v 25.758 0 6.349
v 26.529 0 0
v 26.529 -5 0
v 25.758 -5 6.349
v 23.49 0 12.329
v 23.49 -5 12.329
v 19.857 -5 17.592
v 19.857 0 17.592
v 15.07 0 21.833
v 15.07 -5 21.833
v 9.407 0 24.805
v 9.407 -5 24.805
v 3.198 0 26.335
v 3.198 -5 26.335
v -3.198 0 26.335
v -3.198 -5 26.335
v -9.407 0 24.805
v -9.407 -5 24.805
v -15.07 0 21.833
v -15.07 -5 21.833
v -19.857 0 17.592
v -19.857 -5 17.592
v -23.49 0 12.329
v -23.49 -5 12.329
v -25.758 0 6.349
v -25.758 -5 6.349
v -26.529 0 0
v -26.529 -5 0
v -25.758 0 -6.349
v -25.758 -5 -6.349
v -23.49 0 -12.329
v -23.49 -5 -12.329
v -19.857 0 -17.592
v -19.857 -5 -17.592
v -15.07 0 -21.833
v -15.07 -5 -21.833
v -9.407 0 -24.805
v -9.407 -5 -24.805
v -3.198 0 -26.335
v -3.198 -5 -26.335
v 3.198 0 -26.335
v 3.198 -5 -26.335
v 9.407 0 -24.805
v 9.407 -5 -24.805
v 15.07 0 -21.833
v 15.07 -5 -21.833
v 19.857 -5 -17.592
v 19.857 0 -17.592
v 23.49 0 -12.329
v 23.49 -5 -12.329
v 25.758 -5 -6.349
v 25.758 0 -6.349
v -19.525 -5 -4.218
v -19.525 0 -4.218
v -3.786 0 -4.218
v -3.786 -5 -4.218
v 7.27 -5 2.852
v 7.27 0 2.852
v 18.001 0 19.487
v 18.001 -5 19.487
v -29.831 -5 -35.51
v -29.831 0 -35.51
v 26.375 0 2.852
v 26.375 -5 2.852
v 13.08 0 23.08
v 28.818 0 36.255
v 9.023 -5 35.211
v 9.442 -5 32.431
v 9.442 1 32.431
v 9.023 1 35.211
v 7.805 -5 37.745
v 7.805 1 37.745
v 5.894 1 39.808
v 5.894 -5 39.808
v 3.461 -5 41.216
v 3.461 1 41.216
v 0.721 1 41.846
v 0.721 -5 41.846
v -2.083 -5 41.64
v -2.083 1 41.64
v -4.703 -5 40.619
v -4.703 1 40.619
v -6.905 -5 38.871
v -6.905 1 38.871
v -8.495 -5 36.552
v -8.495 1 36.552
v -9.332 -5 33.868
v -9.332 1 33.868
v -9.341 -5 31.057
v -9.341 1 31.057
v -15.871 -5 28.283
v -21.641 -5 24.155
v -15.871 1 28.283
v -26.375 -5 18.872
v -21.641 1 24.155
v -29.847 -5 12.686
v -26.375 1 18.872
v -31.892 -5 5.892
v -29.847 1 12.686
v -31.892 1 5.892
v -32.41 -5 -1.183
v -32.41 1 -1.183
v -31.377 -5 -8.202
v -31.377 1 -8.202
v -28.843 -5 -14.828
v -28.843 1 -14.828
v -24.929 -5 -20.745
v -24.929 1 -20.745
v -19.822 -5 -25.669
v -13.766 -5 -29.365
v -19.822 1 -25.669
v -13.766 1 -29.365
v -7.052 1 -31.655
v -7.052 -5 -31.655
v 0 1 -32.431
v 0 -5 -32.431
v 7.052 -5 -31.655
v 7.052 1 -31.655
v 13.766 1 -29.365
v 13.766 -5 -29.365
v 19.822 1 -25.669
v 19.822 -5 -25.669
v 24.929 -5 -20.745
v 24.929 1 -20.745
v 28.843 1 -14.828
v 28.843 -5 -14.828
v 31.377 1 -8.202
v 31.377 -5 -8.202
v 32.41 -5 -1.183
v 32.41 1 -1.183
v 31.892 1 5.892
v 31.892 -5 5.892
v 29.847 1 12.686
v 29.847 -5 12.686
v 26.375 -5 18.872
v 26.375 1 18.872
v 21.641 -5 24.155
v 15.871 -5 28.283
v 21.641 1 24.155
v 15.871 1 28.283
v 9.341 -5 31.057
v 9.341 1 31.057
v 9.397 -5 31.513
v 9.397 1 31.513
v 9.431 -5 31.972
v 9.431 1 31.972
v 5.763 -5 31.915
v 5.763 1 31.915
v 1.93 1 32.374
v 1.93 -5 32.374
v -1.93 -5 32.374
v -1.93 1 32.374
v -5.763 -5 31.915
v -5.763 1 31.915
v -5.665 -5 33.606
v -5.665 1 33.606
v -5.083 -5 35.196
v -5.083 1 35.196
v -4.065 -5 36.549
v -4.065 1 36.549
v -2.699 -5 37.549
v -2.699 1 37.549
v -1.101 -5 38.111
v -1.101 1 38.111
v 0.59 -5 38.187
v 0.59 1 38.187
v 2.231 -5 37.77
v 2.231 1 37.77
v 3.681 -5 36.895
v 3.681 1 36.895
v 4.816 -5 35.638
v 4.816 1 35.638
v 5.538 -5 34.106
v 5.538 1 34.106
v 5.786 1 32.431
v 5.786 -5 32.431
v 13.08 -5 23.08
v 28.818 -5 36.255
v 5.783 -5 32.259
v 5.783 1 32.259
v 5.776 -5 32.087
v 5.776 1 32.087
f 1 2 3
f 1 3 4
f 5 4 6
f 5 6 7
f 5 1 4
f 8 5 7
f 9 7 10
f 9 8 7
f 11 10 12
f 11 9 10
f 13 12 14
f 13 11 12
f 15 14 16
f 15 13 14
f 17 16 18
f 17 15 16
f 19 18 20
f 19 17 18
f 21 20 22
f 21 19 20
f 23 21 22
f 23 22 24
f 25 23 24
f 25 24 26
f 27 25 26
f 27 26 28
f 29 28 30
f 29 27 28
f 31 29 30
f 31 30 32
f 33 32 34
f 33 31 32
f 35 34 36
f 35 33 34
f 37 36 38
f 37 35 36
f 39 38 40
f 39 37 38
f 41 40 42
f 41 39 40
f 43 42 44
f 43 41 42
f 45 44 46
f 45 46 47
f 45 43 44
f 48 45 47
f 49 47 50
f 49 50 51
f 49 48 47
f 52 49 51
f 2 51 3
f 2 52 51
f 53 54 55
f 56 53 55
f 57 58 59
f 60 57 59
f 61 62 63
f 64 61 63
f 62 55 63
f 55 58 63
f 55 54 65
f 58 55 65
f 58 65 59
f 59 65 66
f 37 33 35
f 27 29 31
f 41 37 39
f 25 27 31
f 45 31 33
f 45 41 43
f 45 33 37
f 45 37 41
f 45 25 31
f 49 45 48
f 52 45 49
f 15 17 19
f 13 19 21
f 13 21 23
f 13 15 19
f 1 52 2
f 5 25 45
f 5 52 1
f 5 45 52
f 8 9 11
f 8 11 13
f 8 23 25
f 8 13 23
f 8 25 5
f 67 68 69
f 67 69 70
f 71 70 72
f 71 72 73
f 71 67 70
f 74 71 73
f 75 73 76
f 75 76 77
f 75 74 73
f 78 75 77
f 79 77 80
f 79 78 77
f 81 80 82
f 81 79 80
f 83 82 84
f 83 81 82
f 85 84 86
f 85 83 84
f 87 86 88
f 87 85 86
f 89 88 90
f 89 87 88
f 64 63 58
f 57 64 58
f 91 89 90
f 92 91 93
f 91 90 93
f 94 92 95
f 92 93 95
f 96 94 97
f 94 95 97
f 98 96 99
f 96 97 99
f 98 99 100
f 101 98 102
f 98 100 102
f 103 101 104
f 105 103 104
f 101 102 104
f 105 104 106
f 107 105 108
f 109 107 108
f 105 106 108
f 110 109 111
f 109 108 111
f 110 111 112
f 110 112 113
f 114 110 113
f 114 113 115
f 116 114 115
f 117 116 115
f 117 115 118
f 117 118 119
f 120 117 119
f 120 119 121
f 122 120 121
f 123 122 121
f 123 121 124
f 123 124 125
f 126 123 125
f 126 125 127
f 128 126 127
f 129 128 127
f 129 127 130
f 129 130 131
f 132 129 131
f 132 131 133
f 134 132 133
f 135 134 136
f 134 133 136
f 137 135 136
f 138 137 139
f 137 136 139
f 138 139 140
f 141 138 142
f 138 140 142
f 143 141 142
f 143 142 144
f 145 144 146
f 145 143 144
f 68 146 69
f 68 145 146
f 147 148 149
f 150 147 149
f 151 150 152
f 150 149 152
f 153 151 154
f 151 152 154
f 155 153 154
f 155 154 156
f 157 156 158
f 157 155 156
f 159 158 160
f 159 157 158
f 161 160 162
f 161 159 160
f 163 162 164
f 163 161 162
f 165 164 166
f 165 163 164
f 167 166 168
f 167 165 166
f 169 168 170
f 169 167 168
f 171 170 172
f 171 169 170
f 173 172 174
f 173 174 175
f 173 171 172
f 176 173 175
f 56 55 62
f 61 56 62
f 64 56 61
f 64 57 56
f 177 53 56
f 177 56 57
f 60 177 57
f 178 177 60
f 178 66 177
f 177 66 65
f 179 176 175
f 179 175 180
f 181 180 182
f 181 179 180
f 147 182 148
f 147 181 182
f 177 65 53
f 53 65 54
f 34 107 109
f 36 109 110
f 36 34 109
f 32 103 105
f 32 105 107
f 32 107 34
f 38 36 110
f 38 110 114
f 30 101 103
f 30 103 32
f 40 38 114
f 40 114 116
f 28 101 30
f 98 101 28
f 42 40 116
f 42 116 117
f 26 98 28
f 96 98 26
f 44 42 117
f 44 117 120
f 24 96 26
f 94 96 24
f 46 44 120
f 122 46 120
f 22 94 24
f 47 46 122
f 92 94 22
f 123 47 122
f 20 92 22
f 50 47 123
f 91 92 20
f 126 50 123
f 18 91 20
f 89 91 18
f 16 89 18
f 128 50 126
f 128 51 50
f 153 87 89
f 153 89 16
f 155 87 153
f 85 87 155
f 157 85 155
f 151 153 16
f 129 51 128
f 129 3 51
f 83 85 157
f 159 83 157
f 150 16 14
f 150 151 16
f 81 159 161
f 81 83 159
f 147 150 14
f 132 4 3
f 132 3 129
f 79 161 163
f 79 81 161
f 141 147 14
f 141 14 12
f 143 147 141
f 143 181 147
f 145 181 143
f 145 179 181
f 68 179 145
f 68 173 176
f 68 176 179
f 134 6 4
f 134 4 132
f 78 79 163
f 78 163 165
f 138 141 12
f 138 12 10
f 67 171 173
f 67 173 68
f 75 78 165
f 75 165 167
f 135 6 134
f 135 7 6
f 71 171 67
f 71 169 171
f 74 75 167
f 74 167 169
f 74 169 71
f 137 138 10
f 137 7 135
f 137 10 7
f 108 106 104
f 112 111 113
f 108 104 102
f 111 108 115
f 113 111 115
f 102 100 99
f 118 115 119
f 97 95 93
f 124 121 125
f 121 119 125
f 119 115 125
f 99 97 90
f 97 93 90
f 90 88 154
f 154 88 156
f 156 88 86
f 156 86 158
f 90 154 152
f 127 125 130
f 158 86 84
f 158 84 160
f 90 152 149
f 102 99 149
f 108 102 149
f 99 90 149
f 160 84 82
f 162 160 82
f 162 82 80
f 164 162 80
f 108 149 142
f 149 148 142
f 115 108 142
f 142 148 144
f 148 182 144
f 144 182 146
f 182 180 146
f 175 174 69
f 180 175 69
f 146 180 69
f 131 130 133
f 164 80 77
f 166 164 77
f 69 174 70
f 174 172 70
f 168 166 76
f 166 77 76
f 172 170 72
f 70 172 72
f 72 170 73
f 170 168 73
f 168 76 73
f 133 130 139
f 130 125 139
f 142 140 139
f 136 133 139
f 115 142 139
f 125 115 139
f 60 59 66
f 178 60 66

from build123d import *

# Parameters (mm, degrees)
F0_R     = 32.4313338528
F1_DEPTH = 1
F2_R     = 32.4313338528
F2_R_2   = 26.5287639538
F3_DEPTH = 5
F5_DEPTH = 5
F7_DEPTH = 6


with BuildPart() as f1:
    # F0 (on Front) → F1 (new body)
    with BuildSketch(Plane.XZ):
        Circle(F0_R)
    extrude(amount=-F1_DEPTH)

    # F2 (on face) → F3 (join)
    with BuildSketch(Plane.XZ):
        Circle(F2_R)
        Circle(F2_R_2, mode=Mode.SUBTRACT)
    extrude(amount=F3_DEPTH)

    # F6 (on face) → F7 (join)
    with BuildSketch(Plane.XZ.offset(5)):
        with BuildLine():
            ThreePointArc((-5.7628004775, 31.9152243628), (-0.258312309, 38.2114301409), (5.7858653932, 32.4313338528))
            ThreePointArc((5.7858653932, 32.4313338528), (5.7800962881, 32.1730215438), (5.7628004775, 31.9152243628))
            ThreePointArc((5.7628004775, 31.9152243628), (7.5641556763, 31.536882604), (9.3411452706, 31.0569544628))
            ThreePointArc((9.3411452706, 31.0569544628), (9.4165362852, 31.7423069577), (9.4417113742, 32.4313338528))
            ThreePointArc((9.4417113742, 32.4313338528), (-0.6890268951, 41.8478701381), (-9.3411452706, 31.0569544628))
            ThreePointArc((-9.3411452706, 31.0569544628), (-7.5641556763, 31.536882604), (-5.7628004775, 31.9152243628))
        make_face()
    extrude(amount=-F7_DEPTH)


with BuildPart() as f5:
    # F4 (on face) → F5 (new body)
    with BuildSketch(Plane.XZ):
        with BuildLine():
            ThreePointArc((18.0009097166, 19.4869845356), (15.6441670807, 21.4251103443), (13.08046056, 23.0797935098))
            Line((13.08046056, 23.0797935098), (-19.5253267884, -4.2180763558))
            Line((-19.5253267884, -4.2180763558), (-3.7856386043, -4.2180763558))
            Line((-3.7856386043, -4.2180763558), (-17.133077543, -20.2542087187))
            ThreePointArc((-17.133077543, -20.2542087187), (-14.7905568302, -22.0230503239), (-12.2669577951, -23.5222673943))
            Line((-12.2669577951, -23.5222673943), (26.3750613609, 2.851570642))
            Line((26.3750613609, 2.851570642), (7.2696207962, 2.851570642))
            Line((7.2696207962, 2.851570642), (18.0009097166, 19.4869845356))
        make_face()
        with BuildLine():
            ThreePointArc((-12.2669577951, -23.5222673943), (-14.7905568302, -22.0230503239), (-17.133077543, -20.2542087187))
            Line((-17.133077543, -20.2542087187), (-29.8310760409, -35.5100780725))
            Line((-29.8310760409, -35.5100780725), (-12.2669577951, -23.5222673943))
        make_face()
        with BuildLine():
            Line((18.0009097166, 19.4869845356), (28.8180038333, 36.2554118037))
            Line((28.8180038333, 36.2554118037), (13.08046056, 23.0797935098))
            ThreePointArc((13.08046056, 23.0797935098), (15.6441670807, 21.4251103443), (18.0009097166, 19.4869845356))
        make_face()
    extrude(amount=F5_DEPTH)


solid = Compound([f1.part, f5.part])
